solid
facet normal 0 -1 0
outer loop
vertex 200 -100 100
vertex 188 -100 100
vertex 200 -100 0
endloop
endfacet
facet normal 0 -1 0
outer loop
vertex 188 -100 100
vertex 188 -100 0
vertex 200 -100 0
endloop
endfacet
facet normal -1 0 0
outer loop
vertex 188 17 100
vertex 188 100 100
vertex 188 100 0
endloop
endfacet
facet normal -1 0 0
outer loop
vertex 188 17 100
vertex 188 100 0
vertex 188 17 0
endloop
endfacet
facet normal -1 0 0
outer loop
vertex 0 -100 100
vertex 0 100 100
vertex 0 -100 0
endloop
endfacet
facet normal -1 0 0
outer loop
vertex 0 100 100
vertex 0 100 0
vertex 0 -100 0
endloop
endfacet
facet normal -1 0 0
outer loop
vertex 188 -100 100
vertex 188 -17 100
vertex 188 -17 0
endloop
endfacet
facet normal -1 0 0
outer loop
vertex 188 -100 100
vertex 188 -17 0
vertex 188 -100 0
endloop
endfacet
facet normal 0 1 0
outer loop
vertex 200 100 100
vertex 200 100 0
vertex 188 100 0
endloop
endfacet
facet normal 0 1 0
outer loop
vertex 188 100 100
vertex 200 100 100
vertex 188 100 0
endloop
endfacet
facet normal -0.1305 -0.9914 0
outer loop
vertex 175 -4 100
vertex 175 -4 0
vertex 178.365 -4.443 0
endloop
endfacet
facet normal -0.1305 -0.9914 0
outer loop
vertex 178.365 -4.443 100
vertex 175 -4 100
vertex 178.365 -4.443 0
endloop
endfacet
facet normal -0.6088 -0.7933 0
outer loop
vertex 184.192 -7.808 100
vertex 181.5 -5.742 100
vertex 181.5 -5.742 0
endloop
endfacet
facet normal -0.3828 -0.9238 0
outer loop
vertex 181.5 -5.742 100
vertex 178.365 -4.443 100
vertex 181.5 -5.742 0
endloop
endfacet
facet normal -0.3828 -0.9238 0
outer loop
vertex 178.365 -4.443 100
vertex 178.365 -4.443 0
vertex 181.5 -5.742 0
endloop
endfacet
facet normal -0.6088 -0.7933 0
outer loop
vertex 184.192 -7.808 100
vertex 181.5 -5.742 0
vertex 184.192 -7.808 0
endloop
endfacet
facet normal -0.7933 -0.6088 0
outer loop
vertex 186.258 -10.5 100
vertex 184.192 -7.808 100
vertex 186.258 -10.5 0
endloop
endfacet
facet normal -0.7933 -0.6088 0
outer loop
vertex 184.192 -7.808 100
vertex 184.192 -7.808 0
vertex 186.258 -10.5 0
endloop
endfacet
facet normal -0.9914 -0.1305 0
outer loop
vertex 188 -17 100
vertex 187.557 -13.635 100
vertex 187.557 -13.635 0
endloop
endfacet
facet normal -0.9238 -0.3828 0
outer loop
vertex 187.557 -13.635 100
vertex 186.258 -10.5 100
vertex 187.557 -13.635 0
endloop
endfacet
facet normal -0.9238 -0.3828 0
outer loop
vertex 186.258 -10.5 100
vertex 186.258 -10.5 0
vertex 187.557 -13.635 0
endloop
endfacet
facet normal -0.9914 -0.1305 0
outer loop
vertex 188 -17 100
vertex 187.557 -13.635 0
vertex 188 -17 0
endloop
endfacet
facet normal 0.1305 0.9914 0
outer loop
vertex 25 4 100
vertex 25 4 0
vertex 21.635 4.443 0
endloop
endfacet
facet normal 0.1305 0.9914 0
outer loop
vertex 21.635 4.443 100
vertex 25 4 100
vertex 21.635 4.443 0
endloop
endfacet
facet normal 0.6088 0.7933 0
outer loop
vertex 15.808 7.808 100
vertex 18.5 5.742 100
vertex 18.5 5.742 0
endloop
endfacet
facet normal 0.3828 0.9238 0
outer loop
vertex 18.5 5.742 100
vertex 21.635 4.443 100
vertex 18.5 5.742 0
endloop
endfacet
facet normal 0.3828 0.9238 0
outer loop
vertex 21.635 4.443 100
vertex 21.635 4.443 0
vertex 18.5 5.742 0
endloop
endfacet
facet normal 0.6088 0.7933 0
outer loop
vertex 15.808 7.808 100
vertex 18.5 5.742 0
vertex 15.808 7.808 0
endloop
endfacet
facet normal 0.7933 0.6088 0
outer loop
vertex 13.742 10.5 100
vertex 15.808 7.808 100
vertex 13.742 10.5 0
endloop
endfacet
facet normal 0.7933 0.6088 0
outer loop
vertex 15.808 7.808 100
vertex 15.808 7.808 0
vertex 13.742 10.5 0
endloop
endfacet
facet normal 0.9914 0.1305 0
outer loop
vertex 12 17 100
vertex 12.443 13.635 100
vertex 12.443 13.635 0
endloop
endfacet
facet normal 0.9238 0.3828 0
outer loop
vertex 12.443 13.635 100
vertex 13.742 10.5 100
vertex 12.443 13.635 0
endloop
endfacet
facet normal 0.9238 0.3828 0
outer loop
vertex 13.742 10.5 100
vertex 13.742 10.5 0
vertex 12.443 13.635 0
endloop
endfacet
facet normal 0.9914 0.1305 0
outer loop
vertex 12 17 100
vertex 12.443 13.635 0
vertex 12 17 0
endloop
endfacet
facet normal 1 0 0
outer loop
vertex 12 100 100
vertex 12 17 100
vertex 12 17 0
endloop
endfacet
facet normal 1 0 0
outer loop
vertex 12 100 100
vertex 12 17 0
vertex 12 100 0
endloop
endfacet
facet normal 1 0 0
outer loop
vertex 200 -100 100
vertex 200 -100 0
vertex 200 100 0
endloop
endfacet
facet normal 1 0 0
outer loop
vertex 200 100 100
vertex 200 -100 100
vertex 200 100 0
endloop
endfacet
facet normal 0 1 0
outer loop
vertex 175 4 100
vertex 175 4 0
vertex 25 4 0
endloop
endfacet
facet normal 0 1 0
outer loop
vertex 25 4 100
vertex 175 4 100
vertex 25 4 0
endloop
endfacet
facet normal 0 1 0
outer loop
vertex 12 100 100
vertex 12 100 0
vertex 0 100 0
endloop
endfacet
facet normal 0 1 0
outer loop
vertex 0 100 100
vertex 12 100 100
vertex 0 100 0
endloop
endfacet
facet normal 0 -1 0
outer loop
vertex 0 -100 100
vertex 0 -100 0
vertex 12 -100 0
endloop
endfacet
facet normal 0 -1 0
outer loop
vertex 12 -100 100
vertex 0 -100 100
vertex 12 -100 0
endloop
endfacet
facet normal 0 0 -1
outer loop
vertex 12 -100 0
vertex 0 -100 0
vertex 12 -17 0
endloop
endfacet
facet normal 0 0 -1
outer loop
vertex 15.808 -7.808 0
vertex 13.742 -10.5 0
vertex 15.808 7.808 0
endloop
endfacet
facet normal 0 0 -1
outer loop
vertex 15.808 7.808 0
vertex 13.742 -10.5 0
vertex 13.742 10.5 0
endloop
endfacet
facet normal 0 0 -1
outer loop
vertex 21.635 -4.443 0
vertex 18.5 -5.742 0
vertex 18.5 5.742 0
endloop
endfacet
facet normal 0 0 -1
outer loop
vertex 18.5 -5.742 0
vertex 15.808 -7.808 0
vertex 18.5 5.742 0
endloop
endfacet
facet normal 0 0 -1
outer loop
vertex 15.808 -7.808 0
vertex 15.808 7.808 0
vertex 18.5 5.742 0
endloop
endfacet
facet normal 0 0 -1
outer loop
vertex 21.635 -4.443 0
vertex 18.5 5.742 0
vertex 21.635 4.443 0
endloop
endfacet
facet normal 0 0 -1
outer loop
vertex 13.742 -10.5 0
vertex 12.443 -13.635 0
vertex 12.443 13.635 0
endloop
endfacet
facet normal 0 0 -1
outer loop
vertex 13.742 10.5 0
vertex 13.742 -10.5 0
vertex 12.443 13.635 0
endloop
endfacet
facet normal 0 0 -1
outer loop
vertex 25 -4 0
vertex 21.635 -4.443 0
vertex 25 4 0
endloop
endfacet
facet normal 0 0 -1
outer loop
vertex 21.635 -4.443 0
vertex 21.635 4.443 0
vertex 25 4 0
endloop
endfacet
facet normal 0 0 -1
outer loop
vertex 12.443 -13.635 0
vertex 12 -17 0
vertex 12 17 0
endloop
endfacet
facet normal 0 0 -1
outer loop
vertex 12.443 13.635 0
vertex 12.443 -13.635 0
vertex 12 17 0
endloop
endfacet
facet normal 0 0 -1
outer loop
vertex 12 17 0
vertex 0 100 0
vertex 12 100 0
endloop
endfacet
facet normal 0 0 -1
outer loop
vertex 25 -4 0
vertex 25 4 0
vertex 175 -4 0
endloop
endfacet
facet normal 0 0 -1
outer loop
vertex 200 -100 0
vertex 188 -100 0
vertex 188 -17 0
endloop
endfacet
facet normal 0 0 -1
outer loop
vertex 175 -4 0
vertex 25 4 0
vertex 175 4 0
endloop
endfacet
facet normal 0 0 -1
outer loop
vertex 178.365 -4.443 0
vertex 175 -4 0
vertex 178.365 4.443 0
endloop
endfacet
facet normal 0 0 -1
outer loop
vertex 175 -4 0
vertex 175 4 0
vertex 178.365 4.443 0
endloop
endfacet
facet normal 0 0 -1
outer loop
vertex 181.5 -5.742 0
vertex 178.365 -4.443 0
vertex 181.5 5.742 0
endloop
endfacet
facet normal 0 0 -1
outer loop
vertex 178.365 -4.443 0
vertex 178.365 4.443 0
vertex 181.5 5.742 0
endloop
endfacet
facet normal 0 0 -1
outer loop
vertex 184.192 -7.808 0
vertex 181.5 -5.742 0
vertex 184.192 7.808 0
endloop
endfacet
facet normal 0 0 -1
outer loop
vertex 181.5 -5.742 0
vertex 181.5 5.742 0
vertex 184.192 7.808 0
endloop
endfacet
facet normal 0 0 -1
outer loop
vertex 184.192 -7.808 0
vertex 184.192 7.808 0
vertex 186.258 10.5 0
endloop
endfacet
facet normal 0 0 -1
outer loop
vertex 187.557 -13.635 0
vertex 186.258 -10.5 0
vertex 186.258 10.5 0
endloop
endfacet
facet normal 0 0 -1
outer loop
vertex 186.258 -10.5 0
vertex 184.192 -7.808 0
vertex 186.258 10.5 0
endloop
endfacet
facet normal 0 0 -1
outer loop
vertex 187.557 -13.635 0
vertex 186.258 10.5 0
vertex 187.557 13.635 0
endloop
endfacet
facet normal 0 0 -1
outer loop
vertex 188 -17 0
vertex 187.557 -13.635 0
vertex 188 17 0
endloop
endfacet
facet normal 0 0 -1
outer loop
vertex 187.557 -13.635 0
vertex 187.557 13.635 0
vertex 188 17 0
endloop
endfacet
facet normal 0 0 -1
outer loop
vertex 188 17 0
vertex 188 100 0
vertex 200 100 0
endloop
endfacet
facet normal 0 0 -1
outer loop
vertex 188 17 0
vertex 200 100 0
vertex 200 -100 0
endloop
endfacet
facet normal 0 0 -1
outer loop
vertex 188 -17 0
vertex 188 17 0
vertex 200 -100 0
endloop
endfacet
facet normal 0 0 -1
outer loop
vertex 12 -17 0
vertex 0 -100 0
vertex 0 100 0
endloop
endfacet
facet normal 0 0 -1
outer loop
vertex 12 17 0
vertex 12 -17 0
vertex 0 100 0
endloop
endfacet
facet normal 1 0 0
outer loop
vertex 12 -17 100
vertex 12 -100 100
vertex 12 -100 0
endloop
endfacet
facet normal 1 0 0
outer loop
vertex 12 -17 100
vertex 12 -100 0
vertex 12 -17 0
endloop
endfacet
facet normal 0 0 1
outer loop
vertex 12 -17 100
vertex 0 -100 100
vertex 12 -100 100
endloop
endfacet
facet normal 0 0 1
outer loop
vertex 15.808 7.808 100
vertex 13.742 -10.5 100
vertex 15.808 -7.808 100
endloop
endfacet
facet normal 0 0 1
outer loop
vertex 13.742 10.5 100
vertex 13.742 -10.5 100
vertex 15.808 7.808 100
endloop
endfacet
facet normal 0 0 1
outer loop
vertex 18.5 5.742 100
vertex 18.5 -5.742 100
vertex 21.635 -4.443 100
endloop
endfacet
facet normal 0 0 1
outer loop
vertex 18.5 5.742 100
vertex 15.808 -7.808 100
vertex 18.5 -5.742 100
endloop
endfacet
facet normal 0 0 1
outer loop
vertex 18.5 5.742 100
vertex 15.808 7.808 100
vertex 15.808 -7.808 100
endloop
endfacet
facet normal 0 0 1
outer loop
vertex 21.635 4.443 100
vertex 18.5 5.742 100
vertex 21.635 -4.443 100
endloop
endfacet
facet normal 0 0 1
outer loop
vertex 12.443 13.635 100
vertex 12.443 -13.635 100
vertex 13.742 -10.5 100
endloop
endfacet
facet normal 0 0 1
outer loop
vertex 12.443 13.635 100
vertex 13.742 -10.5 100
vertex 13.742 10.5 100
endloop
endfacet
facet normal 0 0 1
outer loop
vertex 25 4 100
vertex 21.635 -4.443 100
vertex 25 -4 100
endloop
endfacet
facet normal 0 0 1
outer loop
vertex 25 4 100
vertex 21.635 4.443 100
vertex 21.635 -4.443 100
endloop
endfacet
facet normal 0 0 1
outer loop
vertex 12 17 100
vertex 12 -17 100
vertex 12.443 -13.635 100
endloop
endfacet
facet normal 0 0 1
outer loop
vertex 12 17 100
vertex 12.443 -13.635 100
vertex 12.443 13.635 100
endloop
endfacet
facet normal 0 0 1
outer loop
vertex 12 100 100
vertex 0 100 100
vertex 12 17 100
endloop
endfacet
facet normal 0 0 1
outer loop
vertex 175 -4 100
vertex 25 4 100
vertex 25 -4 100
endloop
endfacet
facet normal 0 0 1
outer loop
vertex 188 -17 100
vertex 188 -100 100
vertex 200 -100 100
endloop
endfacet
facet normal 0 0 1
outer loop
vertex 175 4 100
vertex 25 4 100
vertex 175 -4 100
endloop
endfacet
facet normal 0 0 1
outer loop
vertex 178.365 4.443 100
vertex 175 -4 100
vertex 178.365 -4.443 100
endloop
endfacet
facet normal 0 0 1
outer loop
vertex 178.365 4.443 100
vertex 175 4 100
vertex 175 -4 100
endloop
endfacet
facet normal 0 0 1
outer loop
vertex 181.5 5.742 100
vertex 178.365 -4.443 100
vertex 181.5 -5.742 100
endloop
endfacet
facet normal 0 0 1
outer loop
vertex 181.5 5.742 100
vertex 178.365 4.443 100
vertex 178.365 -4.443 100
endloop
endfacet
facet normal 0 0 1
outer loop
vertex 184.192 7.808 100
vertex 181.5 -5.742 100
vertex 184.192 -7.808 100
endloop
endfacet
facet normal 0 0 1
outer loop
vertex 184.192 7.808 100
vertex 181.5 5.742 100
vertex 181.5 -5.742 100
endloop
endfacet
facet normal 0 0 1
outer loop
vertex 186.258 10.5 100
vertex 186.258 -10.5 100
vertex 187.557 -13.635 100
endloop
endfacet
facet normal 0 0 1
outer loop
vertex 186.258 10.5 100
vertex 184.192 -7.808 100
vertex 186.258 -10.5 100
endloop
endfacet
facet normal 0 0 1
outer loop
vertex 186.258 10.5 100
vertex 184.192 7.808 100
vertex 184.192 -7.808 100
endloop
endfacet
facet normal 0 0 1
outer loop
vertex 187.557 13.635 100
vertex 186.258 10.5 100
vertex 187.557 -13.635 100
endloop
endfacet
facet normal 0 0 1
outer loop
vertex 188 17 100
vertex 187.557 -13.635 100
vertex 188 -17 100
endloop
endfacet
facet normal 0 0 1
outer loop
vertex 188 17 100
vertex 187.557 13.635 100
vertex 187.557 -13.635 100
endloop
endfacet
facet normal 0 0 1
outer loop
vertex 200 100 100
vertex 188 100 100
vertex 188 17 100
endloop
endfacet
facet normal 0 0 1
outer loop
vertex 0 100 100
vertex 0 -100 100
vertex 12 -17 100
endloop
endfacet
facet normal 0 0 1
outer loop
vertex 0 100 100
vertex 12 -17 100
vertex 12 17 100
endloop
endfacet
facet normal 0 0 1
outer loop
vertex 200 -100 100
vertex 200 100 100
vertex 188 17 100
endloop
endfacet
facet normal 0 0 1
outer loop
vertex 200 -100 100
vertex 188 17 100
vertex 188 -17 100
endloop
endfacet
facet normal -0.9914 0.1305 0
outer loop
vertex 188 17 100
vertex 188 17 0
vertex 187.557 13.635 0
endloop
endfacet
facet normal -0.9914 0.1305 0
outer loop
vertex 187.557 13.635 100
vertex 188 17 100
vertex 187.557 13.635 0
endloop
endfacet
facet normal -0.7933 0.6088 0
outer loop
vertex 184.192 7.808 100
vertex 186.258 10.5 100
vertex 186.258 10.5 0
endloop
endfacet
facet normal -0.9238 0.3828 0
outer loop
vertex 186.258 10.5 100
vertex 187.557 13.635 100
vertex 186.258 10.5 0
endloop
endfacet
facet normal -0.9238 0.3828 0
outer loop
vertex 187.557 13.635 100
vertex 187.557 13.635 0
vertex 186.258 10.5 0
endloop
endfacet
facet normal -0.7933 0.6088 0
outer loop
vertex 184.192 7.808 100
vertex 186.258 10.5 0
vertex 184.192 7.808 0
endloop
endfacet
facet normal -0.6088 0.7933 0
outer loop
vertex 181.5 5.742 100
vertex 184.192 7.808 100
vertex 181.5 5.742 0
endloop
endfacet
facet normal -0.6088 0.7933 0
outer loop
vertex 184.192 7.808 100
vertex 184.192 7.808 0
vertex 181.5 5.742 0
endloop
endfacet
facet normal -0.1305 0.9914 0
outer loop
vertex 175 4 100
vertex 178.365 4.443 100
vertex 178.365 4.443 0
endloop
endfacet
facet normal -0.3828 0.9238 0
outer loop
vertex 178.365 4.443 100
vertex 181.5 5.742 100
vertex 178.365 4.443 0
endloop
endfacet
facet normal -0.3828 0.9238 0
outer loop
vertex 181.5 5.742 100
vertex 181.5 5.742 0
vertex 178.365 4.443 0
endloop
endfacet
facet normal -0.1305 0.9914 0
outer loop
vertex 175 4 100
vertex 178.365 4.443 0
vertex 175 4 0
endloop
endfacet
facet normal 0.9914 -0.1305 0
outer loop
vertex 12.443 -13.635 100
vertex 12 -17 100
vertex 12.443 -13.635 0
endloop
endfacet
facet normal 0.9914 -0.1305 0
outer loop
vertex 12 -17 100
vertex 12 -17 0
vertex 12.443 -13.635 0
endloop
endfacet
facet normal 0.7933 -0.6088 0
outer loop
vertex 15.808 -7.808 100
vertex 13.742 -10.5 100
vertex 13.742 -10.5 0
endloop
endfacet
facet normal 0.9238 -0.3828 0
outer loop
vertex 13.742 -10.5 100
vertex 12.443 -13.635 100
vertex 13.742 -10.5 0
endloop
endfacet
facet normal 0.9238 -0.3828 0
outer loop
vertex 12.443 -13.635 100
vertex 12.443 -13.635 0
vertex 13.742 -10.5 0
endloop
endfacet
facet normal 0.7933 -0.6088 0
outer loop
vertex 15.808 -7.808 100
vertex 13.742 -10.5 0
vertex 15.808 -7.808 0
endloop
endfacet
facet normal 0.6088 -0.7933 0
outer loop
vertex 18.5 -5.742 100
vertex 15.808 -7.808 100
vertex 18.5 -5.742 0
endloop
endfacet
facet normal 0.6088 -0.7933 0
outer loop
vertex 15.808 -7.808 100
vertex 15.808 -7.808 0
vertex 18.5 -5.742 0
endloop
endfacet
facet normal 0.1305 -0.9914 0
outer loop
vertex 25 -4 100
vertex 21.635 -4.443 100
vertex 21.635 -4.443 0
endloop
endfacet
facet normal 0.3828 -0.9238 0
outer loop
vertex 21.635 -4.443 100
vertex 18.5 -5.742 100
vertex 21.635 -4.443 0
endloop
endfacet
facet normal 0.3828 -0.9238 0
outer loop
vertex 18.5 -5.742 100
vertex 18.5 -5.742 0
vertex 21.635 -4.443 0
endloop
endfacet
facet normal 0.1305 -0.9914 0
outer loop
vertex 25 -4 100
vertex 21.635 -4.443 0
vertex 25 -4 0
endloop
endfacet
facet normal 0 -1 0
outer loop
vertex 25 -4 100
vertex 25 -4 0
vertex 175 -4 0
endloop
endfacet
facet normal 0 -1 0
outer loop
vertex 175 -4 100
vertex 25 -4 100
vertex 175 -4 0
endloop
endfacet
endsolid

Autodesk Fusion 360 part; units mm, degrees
sketch "スケッチ1" plane through (0, 0, 0) normal (0, 0, 1) x (1, 0, 0)
  line L0 (0, 100) -> (0, -100)
  line L1 (200, -100) -> (200, 100)
  line L2 (188, -17) -> (188, -100)
  line L3 (12, -100) -> (12, -17)
  line L4 (0, -100) -> (12, -100)
  line L5 (188, -100) -> (200, -100)
  line L6 (12, 17) -> (12, 100)
  line L7 (188, 100) -> (188, 17)
  line L8 (175, 4) -> (25, 4)
  line L9 (25, -4) -> (175, -4)
  arc A0 (25, -4) -> (12, -17) centre (25, -17) ccw
  arc A1 (12, 17) -> (25, 4) centre (25, 17) ccw
  arc A2 (188, -17) -> (175, -4) centre (175, -17) ccw
  arc A3 (175, 4) -> (188, 17) centre (175, 17) ccw
  line L10 (12, 100) -> (0, 100)
  line L11 (200, 100) -> (188, 100)
extrude "押し出し1" add sketch "スケッチ1" along normal blind 100
